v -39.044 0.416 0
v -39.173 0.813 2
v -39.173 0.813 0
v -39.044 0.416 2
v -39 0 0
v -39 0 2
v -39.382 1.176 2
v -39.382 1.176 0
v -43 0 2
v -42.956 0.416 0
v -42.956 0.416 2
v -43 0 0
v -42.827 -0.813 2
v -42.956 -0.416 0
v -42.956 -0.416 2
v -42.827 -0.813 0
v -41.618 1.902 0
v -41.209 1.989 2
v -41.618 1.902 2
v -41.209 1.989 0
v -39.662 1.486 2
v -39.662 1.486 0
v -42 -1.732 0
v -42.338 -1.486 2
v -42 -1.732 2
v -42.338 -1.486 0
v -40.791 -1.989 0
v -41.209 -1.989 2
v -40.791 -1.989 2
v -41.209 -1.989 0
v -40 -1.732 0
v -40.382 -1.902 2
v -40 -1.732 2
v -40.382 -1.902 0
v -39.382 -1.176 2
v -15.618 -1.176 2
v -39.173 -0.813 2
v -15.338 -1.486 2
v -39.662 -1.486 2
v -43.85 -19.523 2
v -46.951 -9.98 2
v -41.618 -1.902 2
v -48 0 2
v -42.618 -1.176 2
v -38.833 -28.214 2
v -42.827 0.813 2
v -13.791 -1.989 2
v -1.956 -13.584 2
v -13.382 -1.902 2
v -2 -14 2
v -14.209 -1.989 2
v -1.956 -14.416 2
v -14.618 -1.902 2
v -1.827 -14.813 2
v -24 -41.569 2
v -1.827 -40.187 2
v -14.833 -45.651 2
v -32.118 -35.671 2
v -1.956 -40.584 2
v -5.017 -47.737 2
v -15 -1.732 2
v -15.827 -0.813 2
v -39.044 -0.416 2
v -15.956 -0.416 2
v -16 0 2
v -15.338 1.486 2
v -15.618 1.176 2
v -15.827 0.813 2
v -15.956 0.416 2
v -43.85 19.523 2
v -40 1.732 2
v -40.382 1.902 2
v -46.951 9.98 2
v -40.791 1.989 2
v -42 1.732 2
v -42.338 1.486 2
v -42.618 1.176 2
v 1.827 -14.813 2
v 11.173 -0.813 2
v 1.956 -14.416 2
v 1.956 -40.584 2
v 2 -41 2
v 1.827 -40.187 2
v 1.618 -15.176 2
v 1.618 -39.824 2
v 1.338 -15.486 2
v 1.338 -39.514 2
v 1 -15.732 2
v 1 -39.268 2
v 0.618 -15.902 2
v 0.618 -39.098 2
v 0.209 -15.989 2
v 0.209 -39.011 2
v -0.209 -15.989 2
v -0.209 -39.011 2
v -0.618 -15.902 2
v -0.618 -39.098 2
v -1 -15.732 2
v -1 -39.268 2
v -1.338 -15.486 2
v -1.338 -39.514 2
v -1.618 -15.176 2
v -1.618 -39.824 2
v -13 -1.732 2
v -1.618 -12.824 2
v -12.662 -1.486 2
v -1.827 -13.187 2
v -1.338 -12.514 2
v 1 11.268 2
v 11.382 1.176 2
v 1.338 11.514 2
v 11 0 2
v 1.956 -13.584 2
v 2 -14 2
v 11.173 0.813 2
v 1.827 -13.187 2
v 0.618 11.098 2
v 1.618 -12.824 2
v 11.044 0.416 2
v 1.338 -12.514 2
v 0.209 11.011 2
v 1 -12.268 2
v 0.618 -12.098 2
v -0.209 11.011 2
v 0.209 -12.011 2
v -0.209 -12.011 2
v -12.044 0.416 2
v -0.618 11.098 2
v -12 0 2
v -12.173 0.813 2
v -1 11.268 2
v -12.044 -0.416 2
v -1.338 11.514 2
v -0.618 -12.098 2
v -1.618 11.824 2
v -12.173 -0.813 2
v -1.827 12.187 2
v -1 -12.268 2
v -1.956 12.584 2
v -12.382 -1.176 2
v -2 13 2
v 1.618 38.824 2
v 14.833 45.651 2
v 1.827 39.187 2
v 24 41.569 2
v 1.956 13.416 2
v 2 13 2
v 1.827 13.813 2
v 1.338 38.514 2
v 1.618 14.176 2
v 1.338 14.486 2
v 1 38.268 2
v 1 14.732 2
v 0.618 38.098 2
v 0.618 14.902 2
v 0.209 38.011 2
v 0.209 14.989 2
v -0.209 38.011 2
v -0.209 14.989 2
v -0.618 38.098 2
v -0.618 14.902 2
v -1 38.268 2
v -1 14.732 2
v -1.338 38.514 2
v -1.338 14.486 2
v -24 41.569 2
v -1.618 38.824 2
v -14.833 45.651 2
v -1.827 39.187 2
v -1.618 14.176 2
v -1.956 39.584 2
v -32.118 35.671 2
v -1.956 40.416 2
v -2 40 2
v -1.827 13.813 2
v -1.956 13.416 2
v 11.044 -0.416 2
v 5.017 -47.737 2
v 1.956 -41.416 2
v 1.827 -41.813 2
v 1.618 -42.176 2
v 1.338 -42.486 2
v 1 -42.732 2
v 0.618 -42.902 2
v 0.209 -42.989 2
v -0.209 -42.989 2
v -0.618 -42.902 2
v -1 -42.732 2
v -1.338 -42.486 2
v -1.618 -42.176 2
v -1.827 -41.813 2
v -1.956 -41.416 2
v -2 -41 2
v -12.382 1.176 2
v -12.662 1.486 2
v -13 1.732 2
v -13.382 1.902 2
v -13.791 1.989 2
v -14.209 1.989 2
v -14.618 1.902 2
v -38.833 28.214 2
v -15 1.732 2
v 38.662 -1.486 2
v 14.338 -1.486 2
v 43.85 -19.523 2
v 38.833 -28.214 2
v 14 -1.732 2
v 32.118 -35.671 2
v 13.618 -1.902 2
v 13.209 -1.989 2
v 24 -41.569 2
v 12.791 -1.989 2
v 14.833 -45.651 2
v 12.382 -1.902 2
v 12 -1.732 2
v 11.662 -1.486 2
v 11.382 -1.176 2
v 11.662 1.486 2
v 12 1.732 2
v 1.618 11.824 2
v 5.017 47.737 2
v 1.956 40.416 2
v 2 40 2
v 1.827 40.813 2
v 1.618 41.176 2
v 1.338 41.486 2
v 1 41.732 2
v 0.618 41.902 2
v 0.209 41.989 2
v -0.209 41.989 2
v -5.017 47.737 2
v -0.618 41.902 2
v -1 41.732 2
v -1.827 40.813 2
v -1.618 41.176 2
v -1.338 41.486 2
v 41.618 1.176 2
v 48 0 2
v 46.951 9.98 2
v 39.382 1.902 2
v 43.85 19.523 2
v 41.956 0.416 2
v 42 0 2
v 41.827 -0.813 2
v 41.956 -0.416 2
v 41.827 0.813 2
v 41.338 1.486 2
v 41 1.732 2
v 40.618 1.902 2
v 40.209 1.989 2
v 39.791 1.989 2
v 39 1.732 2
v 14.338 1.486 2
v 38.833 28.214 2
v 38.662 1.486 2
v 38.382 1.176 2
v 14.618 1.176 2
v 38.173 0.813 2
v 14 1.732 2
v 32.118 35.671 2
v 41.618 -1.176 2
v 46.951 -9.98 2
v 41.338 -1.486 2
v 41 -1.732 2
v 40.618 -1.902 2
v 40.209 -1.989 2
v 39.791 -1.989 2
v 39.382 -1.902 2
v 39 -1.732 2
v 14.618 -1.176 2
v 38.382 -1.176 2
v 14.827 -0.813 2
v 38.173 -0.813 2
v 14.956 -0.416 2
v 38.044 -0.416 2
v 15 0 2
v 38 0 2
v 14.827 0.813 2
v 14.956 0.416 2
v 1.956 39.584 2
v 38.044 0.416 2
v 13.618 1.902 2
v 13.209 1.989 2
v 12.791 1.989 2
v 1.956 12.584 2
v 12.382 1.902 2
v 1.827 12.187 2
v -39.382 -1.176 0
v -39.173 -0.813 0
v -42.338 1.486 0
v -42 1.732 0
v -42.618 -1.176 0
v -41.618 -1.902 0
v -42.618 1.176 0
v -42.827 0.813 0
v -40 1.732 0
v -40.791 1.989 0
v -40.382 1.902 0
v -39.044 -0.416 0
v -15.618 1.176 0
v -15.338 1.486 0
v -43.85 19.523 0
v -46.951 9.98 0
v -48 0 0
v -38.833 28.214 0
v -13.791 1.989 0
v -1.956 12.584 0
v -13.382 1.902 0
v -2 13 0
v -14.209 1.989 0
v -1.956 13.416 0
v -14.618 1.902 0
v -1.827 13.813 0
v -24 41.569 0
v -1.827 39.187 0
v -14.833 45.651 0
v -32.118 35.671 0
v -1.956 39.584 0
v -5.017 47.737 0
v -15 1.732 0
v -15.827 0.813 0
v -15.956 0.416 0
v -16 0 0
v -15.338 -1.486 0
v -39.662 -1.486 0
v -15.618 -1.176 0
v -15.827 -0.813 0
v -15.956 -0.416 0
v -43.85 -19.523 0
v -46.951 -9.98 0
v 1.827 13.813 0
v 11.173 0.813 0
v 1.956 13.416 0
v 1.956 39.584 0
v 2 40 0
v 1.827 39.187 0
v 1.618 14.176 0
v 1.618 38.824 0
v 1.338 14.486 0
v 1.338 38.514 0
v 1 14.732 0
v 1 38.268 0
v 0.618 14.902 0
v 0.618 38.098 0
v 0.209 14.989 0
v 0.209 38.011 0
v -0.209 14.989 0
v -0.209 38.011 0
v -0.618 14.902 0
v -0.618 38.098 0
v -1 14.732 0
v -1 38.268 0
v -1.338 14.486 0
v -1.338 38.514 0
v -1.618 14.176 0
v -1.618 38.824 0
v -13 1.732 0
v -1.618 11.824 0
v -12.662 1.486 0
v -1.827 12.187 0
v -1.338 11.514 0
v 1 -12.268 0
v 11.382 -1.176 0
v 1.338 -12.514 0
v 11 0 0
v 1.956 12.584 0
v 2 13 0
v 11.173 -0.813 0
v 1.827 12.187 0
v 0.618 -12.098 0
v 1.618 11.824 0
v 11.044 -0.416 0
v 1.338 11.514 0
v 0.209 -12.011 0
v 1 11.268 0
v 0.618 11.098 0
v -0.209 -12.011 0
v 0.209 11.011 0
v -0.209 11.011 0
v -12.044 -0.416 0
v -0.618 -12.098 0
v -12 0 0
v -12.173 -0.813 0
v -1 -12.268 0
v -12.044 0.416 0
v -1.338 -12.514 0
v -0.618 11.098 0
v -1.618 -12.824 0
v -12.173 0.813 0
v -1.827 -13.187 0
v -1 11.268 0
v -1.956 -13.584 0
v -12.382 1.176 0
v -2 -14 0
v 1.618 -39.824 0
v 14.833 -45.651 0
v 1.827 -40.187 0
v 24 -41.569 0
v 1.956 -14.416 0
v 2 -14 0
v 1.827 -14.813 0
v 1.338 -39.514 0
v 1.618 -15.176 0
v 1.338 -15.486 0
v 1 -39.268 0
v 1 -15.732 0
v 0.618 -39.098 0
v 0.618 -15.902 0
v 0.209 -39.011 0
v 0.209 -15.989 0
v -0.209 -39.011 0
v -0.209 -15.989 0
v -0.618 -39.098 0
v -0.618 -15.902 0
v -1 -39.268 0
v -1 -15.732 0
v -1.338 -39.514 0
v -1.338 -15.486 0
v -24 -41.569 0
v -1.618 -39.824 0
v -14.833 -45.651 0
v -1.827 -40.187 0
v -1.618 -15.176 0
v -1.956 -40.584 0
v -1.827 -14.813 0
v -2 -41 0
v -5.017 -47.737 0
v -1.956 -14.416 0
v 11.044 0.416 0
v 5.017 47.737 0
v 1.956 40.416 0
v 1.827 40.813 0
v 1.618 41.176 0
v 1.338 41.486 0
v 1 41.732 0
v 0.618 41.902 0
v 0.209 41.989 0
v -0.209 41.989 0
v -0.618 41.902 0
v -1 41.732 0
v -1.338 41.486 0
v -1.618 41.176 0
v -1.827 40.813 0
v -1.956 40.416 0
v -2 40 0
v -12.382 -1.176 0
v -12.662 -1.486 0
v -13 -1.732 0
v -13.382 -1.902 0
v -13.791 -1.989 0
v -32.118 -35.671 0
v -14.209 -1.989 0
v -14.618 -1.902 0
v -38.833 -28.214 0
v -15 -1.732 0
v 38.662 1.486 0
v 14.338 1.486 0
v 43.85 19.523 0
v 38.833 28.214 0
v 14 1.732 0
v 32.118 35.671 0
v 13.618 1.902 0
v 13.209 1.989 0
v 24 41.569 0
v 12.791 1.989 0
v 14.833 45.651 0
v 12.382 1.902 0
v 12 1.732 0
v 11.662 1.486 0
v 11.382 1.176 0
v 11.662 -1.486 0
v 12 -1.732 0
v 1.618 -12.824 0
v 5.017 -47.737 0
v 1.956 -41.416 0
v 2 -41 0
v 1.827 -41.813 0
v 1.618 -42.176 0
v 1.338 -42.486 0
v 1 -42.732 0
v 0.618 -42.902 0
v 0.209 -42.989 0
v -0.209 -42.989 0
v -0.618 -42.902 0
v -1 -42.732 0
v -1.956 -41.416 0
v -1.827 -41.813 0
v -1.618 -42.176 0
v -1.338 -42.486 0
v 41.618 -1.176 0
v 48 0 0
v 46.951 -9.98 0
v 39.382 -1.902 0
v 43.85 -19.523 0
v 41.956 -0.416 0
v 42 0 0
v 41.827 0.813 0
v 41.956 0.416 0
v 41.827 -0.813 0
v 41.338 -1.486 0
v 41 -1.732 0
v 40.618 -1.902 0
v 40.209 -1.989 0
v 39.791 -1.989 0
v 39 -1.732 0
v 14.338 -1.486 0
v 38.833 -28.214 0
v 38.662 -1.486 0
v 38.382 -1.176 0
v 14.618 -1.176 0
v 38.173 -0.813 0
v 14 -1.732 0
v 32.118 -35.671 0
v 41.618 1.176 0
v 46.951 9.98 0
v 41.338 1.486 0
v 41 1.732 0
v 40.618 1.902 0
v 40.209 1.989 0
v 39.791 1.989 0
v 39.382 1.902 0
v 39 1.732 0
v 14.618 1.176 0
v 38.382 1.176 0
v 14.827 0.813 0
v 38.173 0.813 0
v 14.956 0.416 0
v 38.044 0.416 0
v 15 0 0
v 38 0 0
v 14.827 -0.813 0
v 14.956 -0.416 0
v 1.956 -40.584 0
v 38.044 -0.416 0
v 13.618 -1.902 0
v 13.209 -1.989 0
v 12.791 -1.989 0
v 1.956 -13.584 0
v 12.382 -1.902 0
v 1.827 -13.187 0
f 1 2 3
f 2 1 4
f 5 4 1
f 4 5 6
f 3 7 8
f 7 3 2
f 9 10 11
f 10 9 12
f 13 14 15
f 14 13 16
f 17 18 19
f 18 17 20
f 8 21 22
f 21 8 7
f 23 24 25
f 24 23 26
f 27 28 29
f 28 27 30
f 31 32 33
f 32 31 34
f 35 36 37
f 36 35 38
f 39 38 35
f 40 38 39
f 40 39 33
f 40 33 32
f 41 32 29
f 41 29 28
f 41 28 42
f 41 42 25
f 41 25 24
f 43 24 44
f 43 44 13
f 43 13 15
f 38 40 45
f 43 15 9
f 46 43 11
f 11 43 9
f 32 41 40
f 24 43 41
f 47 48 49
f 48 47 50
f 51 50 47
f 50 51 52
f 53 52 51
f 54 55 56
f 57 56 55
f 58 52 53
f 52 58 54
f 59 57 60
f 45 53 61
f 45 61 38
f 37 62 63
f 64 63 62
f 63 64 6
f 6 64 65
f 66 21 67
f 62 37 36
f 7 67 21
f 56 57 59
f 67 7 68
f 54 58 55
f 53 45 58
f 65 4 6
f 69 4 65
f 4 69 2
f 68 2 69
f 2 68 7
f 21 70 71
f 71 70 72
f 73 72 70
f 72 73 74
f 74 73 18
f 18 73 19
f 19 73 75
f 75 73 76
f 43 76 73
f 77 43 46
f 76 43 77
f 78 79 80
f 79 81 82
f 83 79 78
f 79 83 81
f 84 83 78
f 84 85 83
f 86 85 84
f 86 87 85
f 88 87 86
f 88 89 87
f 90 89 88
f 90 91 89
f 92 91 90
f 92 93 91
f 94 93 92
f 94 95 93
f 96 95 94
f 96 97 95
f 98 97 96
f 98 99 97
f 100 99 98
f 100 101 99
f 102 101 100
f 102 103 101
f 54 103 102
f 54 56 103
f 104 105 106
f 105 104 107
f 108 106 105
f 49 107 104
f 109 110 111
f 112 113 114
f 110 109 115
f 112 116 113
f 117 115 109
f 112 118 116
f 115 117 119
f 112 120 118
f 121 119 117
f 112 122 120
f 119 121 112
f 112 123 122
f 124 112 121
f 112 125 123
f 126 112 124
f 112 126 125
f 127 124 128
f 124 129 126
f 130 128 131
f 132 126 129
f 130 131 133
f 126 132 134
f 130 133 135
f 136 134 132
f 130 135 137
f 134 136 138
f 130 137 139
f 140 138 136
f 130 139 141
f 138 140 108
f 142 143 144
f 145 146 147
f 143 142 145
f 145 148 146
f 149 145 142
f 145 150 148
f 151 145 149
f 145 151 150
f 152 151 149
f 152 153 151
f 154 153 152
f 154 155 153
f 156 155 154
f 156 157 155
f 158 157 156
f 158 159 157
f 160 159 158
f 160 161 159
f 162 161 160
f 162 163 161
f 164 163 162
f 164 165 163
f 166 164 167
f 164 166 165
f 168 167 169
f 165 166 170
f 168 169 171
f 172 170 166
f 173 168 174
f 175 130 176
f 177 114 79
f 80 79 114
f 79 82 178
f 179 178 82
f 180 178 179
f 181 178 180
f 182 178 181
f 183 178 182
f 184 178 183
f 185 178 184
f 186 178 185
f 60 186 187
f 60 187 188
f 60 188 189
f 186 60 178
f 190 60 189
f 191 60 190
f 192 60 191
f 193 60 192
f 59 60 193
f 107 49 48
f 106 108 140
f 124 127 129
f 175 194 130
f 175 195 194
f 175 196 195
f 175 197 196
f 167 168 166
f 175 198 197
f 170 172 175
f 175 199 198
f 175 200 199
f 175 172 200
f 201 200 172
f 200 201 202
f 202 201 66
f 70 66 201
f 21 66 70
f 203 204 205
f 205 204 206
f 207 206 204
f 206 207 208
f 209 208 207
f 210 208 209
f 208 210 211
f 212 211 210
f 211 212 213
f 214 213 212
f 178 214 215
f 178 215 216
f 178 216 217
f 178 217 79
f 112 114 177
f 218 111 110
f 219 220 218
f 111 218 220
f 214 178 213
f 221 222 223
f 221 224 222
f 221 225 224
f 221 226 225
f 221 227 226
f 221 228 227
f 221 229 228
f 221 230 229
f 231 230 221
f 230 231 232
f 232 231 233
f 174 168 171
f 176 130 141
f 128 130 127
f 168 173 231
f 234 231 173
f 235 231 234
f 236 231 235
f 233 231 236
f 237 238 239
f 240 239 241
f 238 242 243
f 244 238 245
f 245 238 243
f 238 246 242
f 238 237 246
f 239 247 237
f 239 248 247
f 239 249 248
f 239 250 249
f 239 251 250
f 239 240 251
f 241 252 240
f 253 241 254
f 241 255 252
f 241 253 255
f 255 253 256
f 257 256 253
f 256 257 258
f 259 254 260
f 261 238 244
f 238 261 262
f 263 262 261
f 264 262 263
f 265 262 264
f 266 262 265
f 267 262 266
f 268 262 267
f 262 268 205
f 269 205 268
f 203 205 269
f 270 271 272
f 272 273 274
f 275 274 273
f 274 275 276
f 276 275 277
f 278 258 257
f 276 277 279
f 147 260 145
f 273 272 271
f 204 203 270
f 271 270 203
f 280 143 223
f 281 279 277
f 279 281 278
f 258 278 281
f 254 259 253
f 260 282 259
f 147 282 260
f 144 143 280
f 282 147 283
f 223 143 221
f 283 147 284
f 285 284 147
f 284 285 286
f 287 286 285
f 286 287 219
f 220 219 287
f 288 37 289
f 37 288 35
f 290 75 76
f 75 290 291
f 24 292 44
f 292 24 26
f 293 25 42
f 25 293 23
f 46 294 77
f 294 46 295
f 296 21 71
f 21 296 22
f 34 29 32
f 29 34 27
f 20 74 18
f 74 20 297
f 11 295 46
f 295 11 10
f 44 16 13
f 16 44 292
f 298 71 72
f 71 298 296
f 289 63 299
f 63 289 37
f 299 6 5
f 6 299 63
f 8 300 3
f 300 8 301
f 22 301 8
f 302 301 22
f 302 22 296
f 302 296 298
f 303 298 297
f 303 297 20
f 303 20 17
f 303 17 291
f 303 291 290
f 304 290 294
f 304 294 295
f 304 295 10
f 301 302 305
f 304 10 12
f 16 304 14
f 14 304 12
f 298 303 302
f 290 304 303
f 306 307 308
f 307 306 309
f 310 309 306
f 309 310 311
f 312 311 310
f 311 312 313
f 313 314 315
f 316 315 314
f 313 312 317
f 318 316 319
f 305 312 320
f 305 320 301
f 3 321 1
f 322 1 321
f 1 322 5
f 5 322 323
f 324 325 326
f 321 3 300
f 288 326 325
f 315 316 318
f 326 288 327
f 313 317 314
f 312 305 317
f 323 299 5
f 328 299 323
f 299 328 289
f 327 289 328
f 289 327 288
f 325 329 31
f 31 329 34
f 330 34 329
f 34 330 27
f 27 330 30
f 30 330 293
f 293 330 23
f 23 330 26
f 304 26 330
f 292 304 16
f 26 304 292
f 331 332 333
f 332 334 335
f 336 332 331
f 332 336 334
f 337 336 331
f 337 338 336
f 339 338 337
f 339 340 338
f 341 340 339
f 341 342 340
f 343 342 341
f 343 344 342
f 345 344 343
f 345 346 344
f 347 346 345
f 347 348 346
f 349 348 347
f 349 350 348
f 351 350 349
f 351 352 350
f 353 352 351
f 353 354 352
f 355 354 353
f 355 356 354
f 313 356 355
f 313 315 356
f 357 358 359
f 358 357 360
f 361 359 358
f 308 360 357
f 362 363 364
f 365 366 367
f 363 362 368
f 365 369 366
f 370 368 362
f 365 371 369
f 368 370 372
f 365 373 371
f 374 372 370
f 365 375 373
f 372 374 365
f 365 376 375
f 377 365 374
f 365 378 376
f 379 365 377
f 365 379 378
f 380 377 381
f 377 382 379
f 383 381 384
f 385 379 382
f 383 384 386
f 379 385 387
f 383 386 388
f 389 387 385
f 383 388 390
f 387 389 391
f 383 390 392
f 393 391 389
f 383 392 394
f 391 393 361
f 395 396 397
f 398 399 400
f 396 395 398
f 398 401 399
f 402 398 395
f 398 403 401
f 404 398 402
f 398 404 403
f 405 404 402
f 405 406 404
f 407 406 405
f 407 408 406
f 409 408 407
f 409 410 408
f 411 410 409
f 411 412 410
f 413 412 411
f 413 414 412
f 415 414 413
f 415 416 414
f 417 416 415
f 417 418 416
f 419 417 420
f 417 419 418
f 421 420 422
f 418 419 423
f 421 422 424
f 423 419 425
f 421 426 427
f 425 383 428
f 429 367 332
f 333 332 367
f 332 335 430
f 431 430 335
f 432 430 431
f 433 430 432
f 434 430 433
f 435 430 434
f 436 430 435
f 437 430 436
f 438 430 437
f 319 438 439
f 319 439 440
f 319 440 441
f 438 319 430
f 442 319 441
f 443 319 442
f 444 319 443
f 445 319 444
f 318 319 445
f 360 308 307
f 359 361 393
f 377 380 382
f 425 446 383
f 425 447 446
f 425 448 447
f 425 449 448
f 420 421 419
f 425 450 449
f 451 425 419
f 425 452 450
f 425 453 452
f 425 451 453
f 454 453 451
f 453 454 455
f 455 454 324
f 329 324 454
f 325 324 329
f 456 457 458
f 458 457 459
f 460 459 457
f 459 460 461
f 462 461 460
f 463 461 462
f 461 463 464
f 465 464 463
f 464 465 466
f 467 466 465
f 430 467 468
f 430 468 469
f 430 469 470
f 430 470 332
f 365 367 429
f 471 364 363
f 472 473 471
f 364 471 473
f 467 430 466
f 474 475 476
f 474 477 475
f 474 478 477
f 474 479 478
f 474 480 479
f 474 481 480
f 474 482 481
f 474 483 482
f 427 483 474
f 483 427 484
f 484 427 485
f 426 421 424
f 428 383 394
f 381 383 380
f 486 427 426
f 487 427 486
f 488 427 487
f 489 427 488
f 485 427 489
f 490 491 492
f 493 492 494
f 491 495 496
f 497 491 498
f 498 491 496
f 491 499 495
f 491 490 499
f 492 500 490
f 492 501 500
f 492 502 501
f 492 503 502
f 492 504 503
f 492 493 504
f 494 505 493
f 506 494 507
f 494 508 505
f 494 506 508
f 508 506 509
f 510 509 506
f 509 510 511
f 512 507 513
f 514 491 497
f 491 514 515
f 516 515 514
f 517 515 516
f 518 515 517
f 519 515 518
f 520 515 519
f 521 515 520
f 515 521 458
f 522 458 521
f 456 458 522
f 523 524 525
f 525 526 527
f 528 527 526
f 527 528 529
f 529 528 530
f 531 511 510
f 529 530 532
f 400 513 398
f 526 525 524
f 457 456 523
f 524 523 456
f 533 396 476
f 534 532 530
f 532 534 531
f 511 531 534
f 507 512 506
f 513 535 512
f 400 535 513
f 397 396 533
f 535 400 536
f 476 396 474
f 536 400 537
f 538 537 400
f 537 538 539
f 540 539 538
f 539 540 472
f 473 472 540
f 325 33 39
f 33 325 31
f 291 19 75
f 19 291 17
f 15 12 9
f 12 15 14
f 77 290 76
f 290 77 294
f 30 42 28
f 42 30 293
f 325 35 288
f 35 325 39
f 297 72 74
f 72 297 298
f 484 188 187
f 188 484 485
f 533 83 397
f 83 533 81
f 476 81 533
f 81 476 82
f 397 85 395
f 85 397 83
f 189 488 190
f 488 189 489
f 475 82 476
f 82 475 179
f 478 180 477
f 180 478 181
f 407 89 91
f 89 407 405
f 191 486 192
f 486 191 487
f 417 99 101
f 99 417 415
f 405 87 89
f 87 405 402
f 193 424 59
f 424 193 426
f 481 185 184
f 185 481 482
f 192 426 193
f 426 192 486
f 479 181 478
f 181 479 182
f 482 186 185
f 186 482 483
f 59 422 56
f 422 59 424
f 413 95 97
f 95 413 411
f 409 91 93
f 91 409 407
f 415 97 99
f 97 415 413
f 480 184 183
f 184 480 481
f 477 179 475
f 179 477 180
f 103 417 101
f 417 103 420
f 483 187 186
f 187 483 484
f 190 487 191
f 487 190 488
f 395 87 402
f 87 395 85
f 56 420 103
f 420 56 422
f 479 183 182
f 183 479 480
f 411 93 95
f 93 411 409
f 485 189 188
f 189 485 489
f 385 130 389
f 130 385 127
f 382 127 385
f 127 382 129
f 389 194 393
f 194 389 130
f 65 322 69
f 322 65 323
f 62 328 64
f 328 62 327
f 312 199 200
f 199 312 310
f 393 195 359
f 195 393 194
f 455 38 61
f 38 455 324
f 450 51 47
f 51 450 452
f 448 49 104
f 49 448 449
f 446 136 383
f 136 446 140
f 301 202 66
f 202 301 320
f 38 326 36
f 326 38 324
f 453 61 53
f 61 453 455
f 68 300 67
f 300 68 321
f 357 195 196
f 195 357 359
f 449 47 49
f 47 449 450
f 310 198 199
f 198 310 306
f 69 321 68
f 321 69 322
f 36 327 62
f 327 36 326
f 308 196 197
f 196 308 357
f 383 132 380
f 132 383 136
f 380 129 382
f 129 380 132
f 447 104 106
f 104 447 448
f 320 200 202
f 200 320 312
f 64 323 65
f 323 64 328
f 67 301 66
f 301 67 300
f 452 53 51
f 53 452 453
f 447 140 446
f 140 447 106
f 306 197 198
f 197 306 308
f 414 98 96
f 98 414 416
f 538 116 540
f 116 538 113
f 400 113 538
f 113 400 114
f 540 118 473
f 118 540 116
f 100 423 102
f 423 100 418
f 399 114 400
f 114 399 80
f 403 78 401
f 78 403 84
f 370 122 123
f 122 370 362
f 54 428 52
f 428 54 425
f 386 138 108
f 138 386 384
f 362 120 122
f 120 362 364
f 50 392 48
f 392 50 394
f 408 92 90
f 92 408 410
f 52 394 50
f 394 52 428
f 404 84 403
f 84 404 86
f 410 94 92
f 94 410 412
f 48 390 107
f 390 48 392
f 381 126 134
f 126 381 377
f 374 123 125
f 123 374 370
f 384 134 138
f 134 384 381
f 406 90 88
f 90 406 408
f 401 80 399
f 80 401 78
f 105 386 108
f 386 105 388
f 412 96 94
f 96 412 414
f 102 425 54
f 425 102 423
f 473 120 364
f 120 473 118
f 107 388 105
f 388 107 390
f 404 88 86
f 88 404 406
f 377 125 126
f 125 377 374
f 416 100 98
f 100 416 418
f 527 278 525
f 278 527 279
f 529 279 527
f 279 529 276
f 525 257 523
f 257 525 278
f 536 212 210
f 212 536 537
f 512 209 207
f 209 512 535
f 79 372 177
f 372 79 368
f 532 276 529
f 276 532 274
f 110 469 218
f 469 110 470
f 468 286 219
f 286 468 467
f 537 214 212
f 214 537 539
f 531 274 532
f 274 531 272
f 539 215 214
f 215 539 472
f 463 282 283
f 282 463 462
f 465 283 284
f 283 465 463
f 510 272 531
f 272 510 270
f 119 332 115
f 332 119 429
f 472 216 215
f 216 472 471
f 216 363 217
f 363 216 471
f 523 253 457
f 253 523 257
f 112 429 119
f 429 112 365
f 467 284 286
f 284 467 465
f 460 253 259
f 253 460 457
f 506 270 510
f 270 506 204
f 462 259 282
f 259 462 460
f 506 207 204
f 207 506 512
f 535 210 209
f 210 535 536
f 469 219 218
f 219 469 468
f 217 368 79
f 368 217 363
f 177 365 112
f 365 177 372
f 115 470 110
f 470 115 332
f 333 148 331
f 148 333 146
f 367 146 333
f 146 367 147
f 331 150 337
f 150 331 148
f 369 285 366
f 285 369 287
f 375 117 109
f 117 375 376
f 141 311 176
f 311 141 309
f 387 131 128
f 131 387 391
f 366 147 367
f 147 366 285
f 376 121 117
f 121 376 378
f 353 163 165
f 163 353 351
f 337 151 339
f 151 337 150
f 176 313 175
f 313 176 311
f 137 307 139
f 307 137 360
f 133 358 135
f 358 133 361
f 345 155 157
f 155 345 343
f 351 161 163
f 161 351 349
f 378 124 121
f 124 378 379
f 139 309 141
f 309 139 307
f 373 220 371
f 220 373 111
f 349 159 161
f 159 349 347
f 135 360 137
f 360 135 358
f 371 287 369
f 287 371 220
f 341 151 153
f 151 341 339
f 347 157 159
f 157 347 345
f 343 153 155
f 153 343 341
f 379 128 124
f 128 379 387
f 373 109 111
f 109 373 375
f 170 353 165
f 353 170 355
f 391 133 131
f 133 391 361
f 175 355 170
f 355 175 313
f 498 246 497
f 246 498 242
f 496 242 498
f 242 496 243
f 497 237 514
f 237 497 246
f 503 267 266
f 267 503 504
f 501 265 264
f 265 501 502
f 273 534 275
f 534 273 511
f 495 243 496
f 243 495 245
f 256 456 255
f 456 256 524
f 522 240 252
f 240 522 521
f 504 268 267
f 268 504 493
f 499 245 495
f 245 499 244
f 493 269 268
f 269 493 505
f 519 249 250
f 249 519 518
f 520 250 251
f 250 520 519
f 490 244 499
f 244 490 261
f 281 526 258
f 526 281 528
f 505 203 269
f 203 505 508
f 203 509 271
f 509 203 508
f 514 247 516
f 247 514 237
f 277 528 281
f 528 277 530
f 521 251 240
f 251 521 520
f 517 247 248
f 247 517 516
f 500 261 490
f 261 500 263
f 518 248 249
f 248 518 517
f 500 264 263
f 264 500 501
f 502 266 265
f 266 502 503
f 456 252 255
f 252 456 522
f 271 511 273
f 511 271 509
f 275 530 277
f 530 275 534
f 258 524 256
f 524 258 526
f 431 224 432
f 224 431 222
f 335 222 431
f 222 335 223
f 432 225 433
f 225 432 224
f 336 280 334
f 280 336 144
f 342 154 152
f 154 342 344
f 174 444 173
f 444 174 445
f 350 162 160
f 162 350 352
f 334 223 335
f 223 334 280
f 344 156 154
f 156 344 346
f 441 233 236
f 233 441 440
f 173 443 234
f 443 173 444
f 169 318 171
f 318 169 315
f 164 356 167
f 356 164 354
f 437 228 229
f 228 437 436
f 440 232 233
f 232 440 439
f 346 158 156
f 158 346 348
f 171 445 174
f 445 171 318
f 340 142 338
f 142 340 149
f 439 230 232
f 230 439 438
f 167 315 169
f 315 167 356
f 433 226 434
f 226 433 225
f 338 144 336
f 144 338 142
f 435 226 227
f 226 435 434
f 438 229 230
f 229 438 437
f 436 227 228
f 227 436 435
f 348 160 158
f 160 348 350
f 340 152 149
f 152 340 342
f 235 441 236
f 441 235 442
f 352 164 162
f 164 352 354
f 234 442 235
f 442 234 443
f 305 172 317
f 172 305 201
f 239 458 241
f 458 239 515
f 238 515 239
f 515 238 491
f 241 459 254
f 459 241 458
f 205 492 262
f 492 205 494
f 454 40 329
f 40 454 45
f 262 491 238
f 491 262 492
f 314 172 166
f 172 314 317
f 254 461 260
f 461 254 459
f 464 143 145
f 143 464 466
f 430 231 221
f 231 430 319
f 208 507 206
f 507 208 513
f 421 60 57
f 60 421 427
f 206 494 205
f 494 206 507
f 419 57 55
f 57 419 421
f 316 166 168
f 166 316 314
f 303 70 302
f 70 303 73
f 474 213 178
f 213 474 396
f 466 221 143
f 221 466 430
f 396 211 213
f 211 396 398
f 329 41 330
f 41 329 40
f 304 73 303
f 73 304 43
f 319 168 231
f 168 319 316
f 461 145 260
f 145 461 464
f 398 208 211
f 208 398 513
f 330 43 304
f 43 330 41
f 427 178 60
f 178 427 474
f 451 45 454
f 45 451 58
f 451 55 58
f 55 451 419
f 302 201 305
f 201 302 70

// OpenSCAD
module cubierta1(h, dg, dp, fn){
    difference(){
        cylinder (h = h, d=dg, $fn=fn);
        
        for (i =[-41: 27 :41 ]) {
            translate([i, 0, 0])
                cylinder (h = h, d=dp, $fn=fn);
            translate([0, i, 0])
                cylinder (h = h, d=dp, $fn=fn);
        }
    }
}

cubierta1(2, 96, 4, 30);
